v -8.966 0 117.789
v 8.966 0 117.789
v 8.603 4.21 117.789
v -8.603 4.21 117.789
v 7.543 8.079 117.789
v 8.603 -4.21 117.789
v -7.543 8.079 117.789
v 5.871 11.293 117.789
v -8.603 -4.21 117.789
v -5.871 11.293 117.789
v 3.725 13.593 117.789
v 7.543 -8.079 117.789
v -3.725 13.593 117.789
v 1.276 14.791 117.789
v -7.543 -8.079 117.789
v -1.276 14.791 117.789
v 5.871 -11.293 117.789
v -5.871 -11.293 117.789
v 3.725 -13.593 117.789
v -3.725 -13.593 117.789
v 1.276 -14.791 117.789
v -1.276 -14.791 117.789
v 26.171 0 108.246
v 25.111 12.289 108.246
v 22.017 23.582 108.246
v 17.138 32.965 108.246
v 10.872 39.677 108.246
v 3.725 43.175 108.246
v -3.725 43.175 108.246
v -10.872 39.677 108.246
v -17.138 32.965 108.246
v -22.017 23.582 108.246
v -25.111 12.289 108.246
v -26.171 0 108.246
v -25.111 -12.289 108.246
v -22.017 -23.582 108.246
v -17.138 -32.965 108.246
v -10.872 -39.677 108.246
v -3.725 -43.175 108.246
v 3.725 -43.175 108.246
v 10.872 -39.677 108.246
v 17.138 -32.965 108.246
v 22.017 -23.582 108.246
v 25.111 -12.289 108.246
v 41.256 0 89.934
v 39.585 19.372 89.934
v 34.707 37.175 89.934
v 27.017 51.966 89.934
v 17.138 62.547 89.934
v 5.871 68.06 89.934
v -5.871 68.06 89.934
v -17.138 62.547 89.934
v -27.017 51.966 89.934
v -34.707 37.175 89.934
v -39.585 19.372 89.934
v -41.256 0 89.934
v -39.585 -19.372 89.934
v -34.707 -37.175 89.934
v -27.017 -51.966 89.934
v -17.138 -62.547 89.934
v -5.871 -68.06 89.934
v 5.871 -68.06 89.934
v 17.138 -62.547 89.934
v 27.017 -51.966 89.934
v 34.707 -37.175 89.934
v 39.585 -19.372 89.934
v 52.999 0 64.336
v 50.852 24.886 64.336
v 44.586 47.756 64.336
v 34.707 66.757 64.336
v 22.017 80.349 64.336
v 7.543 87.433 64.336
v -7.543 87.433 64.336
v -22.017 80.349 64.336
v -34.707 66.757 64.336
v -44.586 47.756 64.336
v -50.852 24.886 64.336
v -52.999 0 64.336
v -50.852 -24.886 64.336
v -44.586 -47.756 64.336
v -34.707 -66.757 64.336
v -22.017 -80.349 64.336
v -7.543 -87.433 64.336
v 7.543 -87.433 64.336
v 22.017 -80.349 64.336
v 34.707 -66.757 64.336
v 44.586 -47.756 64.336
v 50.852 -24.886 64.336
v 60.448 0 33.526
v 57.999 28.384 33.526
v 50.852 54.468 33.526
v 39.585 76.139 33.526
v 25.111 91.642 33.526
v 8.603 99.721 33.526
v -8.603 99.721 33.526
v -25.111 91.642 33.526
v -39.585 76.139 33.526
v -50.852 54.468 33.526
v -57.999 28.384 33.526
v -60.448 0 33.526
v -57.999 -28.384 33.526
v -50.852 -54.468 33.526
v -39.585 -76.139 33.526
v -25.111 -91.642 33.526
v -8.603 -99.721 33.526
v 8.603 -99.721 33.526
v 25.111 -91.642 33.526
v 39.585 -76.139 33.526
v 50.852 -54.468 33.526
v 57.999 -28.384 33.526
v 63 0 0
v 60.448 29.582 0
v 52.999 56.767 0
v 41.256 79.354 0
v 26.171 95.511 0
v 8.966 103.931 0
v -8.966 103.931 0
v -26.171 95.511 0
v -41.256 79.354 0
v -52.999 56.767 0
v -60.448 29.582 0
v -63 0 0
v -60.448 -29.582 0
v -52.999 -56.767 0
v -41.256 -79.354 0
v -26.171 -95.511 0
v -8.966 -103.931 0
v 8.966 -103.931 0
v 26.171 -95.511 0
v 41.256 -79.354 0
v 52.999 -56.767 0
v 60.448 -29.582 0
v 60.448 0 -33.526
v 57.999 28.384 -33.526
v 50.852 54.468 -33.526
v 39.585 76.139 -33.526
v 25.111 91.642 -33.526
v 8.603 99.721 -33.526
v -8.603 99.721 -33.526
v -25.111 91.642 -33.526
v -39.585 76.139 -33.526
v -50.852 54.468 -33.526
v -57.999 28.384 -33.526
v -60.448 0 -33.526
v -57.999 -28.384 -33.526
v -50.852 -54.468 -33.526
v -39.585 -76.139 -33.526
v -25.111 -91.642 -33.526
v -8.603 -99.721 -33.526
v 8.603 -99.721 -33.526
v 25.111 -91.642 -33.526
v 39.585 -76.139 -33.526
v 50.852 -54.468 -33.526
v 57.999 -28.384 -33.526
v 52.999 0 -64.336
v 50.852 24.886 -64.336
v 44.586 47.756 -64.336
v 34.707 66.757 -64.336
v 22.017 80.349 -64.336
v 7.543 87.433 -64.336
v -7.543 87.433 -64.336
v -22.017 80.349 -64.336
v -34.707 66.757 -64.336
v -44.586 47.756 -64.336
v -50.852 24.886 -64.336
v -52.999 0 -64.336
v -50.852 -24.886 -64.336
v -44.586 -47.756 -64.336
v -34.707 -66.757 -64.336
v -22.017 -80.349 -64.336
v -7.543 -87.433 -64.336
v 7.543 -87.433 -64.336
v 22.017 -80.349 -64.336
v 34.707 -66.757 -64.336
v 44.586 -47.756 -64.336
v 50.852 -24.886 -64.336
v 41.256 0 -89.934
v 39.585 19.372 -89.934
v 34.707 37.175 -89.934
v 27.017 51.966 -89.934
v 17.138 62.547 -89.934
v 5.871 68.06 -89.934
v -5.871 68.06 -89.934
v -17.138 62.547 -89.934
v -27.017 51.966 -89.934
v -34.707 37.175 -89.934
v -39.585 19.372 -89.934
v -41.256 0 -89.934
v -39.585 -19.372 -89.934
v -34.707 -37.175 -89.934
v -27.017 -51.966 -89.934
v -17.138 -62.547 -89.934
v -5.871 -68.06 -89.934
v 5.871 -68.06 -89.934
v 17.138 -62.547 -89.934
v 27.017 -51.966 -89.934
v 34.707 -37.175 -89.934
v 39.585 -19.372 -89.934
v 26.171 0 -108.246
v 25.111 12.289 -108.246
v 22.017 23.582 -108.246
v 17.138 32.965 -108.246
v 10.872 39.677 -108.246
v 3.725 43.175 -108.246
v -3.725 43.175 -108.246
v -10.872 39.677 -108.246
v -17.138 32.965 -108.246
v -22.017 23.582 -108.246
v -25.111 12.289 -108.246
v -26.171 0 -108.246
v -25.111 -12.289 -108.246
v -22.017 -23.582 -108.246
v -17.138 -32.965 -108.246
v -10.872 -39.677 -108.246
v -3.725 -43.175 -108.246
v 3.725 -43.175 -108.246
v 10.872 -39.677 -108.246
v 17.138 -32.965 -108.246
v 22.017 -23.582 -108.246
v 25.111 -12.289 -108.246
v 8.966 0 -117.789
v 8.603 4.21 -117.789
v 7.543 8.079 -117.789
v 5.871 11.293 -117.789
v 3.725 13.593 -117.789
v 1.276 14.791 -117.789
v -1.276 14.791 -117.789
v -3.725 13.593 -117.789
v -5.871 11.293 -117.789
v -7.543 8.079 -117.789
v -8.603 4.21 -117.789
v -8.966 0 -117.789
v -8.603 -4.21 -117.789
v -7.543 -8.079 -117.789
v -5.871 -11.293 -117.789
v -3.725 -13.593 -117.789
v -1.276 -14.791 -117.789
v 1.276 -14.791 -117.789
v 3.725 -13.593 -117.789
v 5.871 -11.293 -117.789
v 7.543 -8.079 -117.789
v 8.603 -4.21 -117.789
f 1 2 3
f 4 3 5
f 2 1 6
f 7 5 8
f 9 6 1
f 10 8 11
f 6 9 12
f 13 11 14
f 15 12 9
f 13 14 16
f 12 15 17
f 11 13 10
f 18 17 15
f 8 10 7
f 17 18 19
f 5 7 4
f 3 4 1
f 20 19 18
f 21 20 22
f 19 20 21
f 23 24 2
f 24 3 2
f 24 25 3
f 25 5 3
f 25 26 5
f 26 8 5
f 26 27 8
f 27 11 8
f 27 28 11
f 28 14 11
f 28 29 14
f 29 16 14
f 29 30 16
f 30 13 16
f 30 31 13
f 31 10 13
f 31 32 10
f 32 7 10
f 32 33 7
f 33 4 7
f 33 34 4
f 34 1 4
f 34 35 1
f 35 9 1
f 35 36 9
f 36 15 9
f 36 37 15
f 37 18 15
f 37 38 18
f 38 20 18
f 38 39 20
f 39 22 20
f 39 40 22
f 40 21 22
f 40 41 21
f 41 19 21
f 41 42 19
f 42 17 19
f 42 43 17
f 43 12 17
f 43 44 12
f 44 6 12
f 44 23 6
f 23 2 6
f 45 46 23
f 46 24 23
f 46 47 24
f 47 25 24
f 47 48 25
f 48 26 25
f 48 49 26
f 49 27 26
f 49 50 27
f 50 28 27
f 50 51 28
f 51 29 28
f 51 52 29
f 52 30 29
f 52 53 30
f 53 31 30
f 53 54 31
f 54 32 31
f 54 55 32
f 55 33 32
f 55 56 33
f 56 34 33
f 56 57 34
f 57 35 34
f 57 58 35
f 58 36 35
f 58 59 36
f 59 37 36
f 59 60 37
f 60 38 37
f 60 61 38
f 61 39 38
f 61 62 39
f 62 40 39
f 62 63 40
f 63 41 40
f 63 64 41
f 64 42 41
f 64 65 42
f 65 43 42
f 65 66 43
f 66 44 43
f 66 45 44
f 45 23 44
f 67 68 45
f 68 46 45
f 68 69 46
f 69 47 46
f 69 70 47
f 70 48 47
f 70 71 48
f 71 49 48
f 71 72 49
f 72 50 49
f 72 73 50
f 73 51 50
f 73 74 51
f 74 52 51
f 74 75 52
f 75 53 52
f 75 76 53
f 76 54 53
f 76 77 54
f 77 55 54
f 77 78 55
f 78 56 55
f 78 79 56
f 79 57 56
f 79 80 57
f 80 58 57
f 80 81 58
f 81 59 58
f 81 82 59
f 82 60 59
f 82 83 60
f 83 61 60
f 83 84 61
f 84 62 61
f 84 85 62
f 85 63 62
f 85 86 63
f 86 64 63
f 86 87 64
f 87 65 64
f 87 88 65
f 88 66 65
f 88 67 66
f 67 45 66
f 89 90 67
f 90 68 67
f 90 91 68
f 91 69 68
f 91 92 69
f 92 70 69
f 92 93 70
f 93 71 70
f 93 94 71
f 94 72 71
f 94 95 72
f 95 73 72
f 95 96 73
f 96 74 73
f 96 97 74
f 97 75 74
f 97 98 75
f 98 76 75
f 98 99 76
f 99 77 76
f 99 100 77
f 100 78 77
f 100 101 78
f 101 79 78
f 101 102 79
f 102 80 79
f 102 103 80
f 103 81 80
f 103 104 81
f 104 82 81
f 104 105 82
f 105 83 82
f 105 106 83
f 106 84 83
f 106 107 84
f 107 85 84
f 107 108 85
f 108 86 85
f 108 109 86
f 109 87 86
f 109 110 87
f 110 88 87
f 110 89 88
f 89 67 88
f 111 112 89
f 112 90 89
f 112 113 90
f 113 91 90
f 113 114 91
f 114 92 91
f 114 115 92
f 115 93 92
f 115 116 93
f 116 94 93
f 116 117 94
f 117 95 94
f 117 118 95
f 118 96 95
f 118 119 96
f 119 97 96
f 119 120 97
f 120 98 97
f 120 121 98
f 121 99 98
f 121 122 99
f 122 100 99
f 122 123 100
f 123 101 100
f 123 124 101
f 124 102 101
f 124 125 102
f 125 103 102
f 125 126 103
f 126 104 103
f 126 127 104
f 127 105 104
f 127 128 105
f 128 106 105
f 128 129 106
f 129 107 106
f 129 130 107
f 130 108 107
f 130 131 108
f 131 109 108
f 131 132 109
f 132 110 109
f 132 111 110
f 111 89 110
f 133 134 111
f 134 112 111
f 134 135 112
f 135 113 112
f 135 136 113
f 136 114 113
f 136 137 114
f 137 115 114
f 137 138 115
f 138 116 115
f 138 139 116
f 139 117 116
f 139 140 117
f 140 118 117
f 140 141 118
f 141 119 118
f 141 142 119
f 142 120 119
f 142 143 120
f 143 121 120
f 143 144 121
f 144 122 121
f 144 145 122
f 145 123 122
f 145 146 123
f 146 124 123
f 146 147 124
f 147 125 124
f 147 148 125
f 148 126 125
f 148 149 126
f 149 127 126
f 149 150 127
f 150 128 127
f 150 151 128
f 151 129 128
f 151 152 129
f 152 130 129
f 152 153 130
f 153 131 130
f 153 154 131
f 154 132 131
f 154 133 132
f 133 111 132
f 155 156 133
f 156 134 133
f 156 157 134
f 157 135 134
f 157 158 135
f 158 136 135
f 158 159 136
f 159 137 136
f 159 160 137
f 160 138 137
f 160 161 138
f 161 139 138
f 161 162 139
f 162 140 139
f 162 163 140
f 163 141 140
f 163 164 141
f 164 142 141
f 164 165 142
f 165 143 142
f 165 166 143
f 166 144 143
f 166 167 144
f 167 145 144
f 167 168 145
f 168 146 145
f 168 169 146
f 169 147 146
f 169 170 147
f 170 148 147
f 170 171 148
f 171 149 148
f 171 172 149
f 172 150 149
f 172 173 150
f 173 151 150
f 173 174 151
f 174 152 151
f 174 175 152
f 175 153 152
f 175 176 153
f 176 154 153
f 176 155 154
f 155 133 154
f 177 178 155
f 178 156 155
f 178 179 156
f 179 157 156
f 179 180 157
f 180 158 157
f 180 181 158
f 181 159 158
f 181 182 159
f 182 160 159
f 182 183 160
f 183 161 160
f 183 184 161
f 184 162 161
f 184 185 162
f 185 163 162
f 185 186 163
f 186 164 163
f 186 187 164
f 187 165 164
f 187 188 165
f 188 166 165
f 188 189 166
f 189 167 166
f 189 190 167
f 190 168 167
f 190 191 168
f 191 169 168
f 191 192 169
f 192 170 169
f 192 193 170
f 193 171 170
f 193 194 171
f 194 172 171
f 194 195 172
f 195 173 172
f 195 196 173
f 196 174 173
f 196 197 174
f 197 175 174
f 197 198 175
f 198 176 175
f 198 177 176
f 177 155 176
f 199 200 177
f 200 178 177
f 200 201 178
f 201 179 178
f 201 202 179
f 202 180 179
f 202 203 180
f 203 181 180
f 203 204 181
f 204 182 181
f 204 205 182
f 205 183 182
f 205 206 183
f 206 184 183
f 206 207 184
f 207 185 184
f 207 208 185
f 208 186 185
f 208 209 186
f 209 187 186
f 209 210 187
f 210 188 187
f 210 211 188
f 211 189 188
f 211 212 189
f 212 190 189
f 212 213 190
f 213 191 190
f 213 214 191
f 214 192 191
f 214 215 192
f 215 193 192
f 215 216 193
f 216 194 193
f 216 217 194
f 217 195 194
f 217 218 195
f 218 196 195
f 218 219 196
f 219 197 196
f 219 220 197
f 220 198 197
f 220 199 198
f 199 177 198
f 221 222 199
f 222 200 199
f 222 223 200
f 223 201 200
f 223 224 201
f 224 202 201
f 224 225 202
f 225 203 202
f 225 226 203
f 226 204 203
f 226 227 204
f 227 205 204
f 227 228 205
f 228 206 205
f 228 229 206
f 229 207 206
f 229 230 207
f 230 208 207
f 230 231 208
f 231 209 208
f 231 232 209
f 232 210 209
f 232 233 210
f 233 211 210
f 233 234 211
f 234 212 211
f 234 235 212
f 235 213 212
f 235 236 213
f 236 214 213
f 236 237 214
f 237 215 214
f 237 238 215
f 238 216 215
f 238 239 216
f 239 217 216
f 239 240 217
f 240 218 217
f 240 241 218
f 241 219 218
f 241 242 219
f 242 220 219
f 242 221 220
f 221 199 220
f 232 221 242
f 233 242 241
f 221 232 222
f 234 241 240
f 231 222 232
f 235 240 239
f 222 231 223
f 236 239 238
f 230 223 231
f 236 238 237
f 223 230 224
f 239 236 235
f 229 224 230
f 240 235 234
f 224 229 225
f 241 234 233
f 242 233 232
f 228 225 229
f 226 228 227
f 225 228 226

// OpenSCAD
// Generated by SolidPython 1.0.1 on 2020-07-29 00:46:49


scale(v = [9, 15, 17]) {
	sphere(r = 7);
}
/***********************************************
*********      SolidPython code:      **********
************************************************
 
# import packages: SolidPython
from solid import *
from solid.utils import *
from itertools import chain, combinations, permutations


class Resize:

    def __init__(self, scad_file):
        self.scad_file = scad_file
        #self.scad_file = import_scad(scad_file)
        # cone/cylinder param:
        self.r1 = 0
        self.r2 = 0
        self.h = 0
        # rectangular prism param:
        self.w = 0
        self.l = 0
        # ellipse param:
        self.r = 0

    # import OpenScad code (file name corresponds to shape)


    # classify shape + parameters
    def assign(self, param1, param2, param3):
        if self.scad_file == 'cone.scad':
            self.r1 = param1
            self.r2 = param2
            self.h = param3
        elif self.scad_file == 'cylinder.scad':
            self.r1 = param1
            self.r2 = param2
            self.h = param3
        elif self.scad_file == 'rectangularPrism.scad':
            self.h = param1
            self.l = param2
            self.w = param3
        else:
            self.r = param1
            self.h = param2

    # resize parameters
    def iterate(self):
        x = range(3, 20, 2)
        i = 1
        if self.scad_file == 'cone.scad':
            tempList = list(permutations(x, 2))
            for temp in tempList:
                param1 = temp[0]
                param2 = temp[1]
                filepath = 'produced_scad_files/' + 'cone' + str(param1) + '_' + str(param2) + '_' + '.scad'
                scad_render_to_file(cylinder(h=param1, r1=param2, r2=0), filepath)

        elif self.scad_file == 'cylinder.scad':
            tempList = list(permutations(x, 3))
            for temp in tempList:
                param1 = temp[0]
                param2 = temp[1]
                filepath = 'produced_scad_files/' + 'cylinder' + str(param1) + '_' + str(param2) + '_' + '.scad'
                scad_render_to_file(cylinder(h=param1, r1=param2, r2=param2), filepath)

        elif self.scad_file == 'rectangularPrism.scad':
            tempList = list(permutations(x, 3))
            for temp in tempList:
                param1 = temp[0]
                param2 = temp[1]
                param3 = temp[2]
                filepath = 'produced_scad_files/' + 'rectangularPrism' + str(param1) + '_' + str(param2) + '_' + str(
                    param3) + '.scad'
                scad_render_to_file(cube(size=(param1, param2, param3)), filepath)

        elif self.scad_file == 'ellipse.scad':
            tempList = list(permutations(x, 4))
            for temp in tempList:
                param1 = temp[0]
                param2 = temp[1]
                param3 = temp[2]
                param4 = temp[3]
                filepath = 'produced_scad_files/' + 'ellipse' + str(param1) + '_' + str(param2) + '_' + str(param3) + '_' + str(param4) + '.scad'
                scad_render_to_file(scale([param1, param2, param3])(sphere(r=param4)), filepath)

    def render_to_scadfile(self):
        scad_render_to_file(scad, 'example.scad') 
 
************************************************/
